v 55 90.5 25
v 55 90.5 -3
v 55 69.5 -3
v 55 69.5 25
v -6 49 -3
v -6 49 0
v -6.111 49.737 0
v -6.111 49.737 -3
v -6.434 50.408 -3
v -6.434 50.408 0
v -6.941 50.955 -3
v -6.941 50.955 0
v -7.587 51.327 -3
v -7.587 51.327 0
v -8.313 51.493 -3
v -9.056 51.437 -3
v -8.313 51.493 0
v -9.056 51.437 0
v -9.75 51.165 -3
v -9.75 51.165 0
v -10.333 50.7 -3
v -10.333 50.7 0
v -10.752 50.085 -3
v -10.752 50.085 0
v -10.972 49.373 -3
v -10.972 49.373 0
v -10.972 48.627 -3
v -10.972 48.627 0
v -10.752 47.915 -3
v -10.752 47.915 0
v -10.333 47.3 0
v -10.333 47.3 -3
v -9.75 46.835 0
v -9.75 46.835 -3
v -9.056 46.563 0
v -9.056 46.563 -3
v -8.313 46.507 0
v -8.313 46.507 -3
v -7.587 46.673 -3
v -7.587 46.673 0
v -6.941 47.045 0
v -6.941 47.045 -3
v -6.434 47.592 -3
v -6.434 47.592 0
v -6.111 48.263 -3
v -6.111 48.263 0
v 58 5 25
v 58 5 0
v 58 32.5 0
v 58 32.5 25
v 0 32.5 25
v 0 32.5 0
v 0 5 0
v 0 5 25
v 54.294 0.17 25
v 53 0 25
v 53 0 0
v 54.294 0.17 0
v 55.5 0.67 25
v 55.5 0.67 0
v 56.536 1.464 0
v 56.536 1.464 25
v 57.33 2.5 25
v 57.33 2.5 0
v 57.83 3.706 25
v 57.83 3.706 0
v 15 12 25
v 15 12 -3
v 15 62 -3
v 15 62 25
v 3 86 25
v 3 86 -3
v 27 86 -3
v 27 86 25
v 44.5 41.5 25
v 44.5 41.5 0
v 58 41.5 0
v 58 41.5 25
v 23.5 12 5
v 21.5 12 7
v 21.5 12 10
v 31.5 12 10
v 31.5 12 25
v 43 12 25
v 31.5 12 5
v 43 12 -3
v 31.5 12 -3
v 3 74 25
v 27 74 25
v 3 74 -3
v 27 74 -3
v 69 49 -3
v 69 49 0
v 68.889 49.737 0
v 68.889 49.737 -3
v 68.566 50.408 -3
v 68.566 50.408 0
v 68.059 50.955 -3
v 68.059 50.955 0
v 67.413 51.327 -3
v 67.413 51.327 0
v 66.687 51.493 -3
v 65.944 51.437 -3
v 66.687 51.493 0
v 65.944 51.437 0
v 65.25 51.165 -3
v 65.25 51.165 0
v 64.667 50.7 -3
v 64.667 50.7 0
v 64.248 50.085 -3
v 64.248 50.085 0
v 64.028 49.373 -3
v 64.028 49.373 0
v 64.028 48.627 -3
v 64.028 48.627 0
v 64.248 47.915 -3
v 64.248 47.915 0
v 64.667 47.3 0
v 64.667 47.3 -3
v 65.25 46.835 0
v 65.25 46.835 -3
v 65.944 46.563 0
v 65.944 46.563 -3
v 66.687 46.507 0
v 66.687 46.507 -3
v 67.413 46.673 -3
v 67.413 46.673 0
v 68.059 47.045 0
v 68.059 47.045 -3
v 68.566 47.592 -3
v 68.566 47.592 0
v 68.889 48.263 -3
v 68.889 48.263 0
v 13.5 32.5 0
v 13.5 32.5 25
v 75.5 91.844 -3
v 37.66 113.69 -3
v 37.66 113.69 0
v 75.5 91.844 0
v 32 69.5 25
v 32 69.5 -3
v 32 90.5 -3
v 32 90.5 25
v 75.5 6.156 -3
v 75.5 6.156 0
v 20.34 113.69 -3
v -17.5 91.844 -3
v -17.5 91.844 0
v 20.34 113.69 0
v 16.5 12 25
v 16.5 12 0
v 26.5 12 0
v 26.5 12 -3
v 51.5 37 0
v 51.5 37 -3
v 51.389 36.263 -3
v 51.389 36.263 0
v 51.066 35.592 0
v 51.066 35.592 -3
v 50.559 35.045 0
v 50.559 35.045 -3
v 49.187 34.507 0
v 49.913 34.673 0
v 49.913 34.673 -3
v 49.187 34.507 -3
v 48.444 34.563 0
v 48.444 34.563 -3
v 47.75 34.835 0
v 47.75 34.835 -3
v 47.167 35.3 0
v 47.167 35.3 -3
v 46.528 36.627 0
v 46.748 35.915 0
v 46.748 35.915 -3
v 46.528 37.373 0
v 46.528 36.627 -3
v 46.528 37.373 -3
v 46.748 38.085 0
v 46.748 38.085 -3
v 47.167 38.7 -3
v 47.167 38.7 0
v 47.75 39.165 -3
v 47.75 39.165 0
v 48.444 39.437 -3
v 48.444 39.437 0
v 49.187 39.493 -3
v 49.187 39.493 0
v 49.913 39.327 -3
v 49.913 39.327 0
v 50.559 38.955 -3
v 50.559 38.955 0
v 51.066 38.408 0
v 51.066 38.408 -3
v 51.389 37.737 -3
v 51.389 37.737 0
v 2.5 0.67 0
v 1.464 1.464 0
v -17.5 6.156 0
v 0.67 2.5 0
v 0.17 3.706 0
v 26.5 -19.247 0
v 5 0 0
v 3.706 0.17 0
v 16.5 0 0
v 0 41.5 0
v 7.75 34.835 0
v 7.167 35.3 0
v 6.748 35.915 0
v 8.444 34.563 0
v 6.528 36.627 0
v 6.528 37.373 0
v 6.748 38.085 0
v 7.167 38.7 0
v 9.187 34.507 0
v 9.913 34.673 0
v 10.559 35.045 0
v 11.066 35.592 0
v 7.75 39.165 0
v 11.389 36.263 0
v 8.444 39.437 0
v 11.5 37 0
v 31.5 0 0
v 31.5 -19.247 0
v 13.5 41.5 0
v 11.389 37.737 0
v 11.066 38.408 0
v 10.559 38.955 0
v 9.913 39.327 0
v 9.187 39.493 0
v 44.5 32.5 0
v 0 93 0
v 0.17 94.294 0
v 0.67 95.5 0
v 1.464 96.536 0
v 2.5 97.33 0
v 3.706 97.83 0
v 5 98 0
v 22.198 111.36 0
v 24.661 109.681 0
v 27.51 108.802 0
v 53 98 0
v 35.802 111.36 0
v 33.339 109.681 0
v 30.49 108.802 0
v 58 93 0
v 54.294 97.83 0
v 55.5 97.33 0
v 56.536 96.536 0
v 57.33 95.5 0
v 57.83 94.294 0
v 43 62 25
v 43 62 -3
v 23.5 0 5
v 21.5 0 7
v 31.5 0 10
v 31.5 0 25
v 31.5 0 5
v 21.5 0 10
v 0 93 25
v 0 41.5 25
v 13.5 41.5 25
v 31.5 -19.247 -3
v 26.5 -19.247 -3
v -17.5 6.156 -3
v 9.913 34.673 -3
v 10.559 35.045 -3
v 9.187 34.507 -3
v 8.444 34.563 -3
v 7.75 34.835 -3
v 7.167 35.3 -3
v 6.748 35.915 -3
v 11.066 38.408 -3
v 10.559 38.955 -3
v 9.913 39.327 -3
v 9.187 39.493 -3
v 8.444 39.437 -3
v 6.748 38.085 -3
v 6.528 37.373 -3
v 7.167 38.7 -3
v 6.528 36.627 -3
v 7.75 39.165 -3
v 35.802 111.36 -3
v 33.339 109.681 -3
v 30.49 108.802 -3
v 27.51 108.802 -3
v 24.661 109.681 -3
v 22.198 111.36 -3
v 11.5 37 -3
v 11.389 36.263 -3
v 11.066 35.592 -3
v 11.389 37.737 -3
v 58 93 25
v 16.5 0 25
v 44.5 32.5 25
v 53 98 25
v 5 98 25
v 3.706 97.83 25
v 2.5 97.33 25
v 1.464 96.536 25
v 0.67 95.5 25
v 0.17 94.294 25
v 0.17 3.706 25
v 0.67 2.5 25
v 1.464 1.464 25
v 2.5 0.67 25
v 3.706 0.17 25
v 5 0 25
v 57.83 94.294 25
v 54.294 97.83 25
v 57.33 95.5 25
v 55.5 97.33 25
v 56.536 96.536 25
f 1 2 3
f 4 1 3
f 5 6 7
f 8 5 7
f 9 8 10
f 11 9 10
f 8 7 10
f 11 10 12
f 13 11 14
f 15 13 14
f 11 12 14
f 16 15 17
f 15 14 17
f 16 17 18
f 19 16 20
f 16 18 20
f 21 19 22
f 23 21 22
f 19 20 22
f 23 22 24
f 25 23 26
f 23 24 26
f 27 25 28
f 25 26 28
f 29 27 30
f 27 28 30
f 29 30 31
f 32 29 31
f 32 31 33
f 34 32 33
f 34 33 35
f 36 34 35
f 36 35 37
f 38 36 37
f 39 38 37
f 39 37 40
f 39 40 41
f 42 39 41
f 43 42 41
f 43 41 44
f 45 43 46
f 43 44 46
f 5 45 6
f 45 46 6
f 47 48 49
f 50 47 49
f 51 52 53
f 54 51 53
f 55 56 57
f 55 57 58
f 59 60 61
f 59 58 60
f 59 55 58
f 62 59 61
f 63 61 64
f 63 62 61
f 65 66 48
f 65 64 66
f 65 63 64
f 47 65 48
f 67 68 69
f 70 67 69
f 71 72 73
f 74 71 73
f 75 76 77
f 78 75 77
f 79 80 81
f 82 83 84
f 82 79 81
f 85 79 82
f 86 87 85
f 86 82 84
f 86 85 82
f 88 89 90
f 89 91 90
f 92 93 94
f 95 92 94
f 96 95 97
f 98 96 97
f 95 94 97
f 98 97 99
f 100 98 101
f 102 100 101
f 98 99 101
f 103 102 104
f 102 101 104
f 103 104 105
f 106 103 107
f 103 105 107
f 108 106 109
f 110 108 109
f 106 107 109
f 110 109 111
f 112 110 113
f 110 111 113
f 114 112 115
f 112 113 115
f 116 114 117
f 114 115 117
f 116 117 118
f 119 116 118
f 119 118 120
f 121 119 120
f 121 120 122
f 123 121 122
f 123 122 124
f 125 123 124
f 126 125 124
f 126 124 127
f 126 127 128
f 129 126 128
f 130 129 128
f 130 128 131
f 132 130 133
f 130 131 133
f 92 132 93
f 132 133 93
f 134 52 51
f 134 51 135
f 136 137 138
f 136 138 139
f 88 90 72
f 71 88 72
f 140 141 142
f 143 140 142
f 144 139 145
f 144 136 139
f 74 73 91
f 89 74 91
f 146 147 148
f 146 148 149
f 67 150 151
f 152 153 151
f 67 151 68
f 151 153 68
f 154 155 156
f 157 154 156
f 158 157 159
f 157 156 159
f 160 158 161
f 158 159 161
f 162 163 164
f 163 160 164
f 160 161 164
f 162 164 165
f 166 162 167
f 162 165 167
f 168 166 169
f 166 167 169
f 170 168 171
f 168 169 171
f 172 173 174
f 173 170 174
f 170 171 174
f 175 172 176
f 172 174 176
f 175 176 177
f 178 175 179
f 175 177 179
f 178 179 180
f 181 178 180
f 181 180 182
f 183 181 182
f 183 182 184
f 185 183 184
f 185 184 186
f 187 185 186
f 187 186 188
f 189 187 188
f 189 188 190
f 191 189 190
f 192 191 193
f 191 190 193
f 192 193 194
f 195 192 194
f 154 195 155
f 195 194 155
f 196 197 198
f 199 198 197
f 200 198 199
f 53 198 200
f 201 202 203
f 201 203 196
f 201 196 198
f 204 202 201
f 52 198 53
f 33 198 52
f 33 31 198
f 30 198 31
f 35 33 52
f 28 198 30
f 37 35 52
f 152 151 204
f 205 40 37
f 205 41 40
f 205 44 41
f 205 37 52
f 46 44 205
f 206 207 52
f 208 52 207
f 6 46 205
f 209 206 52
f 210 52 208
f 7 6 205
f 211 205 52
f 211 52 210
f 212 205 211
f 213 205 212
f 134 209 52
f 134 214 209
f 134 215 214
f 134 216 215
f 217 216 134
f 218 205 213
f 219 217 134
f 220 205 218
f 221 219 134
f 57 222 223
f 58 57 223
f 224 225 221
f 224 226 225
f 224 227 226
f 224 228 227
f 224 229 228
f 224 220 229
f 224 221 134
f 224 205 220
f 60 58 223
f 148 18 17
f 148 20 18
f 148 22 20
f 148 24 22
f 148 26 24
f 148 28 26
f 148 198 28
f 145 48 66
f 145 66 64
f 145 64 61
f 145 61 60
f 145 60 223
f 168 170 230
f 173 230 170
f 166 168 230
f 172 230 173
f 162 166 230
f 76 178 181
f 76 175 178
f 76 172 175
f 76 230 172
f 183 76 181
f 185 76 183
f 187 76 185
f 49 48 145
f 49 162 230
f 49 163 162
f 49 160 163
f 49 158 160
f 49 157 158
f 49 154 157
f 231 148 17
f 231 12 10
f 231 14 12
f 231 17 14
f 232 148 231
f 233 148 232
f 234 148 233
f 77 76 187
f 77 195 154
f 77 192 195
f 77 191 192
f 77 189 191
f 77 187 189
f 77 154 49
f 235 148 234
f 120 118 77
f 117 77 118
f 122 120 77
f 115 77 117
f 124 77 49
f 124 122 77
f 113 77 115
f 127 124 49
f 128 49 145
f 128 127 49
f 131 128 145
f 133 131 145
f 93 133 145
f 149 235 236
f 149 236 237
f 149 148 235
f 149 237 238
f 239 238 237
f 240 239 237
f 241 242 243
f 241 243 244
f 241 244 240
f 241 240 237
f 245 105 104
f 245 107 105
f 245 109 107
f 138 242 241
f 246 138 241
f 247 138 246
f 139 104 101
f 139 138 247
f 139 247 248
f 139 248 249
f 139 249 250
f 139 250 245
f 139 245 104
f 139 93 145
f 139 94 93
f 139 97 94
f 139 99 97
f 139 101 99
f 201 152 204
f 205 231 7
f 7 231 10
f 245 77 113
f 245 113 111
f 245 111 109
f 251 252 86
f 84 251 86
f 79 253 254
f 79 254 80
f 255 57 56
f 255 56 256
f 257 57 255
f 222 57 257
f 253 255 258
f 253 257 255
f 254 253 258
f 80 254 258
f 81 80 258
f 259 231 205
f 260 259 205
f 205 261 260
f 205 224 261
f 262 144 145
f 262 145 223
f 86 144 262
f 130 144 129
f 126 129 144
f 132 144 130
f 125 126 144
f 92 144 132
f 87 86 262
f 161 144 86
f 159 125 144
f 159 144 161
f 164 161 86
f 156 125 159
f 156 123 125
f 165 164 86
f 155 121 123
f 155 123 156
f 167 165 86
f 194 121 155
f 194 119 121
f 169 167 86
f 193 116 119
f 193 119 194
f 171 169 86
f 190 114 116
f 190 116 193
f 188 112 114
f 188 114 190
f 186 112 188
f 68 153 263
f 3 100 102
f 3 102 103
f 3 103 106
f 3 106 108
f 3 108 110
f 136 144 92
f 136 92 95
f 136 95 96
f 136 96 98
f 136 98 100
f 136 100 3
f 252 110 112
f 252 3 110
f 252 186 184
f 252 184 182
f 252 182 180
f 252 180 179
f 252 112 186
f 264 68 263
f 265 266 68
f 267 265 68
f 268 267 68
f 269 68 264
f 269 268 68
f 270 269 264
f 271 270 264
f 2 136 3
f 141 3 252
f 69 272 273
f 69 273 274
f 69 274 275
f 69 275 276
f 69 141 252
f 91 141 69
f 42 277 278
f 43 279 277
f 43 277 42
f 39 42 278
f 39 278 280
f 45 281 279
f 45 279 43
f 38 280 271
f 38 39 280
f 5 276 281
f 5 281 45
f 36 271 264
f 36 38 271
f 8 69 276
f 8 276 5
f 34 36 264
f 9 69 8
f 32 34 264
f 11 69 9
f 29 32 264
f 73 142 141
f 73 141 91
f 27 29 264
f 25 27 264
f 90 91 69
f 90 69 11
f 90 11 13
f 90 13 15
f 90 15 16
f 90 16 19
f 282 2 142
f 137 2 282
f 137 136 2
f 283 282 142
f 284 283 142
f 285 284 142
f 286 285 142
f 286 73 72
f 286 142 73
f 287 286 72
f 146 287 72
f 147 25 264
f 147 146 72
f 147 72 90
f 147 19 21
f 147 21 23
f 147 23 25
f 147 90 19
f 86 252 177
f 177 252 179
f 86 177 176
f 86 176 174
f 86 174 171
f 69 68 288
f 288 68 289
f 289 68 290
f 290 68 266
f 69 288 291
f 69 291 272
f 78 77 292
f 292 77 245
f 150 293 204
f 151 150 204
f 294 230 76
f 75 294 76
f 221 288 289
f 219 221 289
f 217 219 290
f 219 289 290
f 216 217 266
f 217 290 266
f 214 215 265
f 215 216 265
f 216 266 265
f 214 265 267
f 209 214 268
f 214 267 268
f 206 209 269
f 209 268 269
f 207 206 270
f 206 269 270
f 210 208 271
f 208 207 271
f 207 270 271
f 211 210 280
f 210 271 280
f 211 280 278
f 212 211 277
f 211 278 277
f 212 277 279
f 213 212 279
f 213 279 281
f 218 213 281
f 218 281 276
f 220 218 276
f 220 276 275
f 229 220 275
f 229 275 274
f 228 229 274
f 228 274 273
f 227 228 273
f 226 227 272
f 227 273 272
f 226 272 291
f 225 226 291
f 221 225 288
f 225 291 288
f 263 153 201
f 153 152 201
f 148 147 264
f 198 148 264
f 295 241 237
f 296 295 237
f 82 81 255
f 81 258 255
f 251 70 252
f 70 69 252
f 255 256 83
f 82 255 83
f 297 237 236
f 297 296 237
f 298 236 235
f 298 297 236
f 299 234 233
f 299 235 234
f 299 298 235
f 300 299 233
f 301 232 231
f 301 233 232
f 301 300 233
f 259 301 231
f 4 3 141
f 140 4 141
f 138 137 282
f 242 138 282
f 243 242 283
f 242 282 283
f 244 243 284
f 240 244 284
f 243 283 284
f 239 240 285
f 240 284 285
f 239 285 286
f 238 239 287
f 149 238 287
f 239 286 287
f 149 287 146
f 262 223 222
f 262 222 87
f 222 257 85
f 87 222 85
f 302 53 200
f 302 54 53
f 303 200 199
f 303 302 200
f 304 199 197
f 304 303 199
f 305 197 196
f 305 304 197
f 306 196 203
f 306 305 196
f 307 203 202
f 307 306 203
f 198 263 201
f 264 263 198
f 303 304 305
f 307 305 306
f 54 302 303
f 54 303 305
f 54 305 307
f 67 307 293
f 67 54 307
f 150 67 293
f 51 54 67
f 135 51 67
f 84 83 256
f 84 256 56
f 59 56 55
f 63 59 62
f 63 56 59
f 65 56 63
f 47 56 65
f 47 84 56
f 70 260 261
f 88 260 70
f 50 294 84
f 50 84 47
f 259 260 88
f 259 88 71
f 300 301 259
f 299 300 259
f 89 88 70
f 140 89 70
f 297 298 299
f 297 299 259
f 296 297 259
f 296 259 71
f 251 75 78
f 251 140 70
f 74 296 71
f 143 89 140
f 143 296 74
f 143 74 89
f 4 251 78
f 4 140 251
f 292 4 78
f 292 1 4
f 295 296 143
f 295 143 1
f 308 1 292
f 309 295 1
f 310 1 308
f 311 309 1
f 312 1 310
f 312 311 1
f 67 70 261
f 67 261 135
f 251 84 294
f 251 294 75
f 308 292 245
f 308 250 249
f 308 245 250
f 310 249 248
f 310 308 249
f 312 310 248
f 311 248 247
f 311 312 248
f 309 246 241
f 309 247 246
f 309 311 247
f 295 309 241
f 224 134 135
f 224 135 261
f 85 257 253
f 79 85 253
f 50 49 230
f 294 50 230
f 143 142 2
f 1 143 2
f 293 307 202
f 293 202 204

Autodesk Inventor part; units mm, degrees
ref_plane "YZ Plane" through (0, 0, 0) normal (1, 0, 0) x (0, 1, 0)
ref_plane "XZ Plane" through (0, 0, 0) normal (0, 1, 0) x (-1, 0, 0)
ref_plane "XY Plane" through (0, 0, 0) normal (0, 0, 1) x (1, 0, 0)
sketch "Sketch1" plane through (0, 0, 0) normal (0, 0, 1) x (1, 0, 0)
  line L0 (0, 0) -> (58, 0)
  line L1 (58, 0) -> (58, 98)
  line L2 (58, 98) -> (0, 98)
  line L3 (0, 98) -> (0, 0)
  line L4 (15, 62) -> (43, 62)
  line L5 (43, 62) -> (43, 12)
  line L6 (43, 12) -> (15, 12)
  line L7 (15, 12) -> (15, 62)
  circle A0 centre (9, 37) radius 2.5
  circle A1 centre (49, 37) radius 2.5
  line L8 (9, 37) -> (49, 37) construction
  line L9 (3, 86) -> (27, 86)
  line L10 (27, 86) -> (27, 74)
  line L11 (27, 74) -> (3, 74)
  line L12 (3, 74) -> (3, 86)
  circle A2 centre (-8.5, 49) radius 2.5
  circle A3 centre (66.5, 49) radius 2.5
  line L13 (-8.5, 49) -> (66.5, 49) construction
  circle A4 centre (-8.5, 49) radius 5 construction
  circle A5 centre (66.5, 49) radius 5 construction
  line L14 (0, 0) -> (-13.3155, 47.6544)
  line L15 (0, 98) -> (-13.3155, 50.3456)
  line L16 (58, 98) -> (71.3155, 50.3456)
  line L17 (58, 0) -> (71.3155, 47.6544)
  arc A6 (-13.3155, 50.3456) -> (-13.3155, 47.6544) centre (-8.5, 49) ccw
  arc A7 (71.3155, 47.6544) -> (71.3155, 50.3456) centre (66.5, 49) ccw
  line L18 (32, 90.5) -> (55, 90.5)
  line L19 (55, 90.5) -> (55, 69.5)
  line L20 (55, 69.5) -> (32, 69.5)
  line L21 (32, 69.5) -> (32, 90.5)
  line L22 (3, 80) -> (55, 80) construction
  point P0 (29, 62)
  point P1 (29, 98)
  point P2 (29, 37)
  point P3 (15, 37)
  point P4 (29, 49)
  point P5 (0, 49)
  point P6 (29, 80)
  dimension "d0" = 58
  dimension "d1" = 98
  dimension "d2" = 28
  dimension "d3" = 50
  dimension "d4" = 12
  dimension "d5" = 5
  dimension "d6" = 5
  dimension "d7" = 40
  dimension "d9" = 24
  dimension "d10" = 12
  dimension "d12" = 12
  dimension "d13" = 5
  dimension "d14" = 5
  dimension "d15" = 75
  dimension "d16" = 10
  dimension "d17" = 10
  dimension "d18" = 23
  dimension "d19" = 21
  dimension "d20" = 5
extrude "Extrusion1" add sketch "Sketch1" against normal blind 3
extrude "Extrusion2" add sketch "Sketch1" along normal blind 25 contours L3 L2 L1 L0
fillet "Fillet1" radius 5 4 edges at (58, 98, 12.5) (58, 0, 12.5) (0, 0, 12.5) (0, 98, 12.5)
sketch "Sketch2" plane through (0, 0, 0) normal (0, 0, 1) x (1, 0, 0)
  circle A0 centre (49, 37) radius 2.5 projected
  circle A1 centre (9, 37) radius 2.5 projected
  line L0 (0, 5) -> (0, 93) projected
  line L1 (0, 32.5) -> (13.5, 32.5)
  line L2 (13.5, 32.5) -> (13.5, 41.5)
  line L3 (13.5, 41.5) -> (0, 41.5)
  line L4 (0, 41.5) -> (0, 32.5)
  line L5 (58, 5) -> (58, 93) projected
  line L6 (58, 32.5) -> (44.5, 32.5)
  line L7 (44.5, 32.5) -> (44.5, 41.5)
  line L8 (44.5, 41.5) -> (58, 41.5)
  line L9 (58, 41.5) -> (58, 32.5)
  line L10 (15, 62) -> (15, 12) projected
  line L11 (43, 12) -> (43, 62) projected
  point P0 (0, 0)
  point P1 (13.5, 37)
  point P2 (44.5, 37)
  dimension "d29" = 4.5
  dimension "d30" = 4.5
  dimension "d31" = 9
extrude "Extrusion3" cut sketch "Sketch2" along normal through all
sketch "Sketch3" plane through (0, 0, -3) normal (0, 0, -1) x (-1, 0, 0)
  circle A0 centre (-29, -5) radius 2.5 construction
  circle A1 centre (-29, 103) radius 2.5 construction
  line L0 (0, 98) -> (-58, 98) projected
  line L1 (-58, 0) -> (0, 0) projected
  line L2 (-58, 98) -> (-29.6325, 105.4187)
  line L3 (0, 98) -> (-28.3675, 105.4187)
  line L4 (0, 0) -> (-28.3675, -7.4187)
  line L5 (-58, 0) -> (-29.6325, -7.4187)
  arc A2 (-29.6325, -7.4187) -> (-28.3675, -7.4187) centre (-29, -5) ccw
  arc A3 (-28.3675, 105.4187) -> (-29.6325, 105.4187) centre (-29, 103) ccw
  point P0 (-29, 98)
  dimension "d34" = 5
  dimension "d35" = 5
  dimension "d36" = 5
  dimension "d37" = 5
extrude "Extrusion4" add sketch "Sketch3" against normal blind 3
fillet "Fillet2" radius 5 4 edges at (0, 98, -1.5) (58, 98, -1.5) (58, 0, -1.5) (0, 0, -1.5)
sketch "Sketch4" plane through (0, 0, -3) normal (0, 0, -1) x (-1, 0, 0)
  line L0 (-15, 62) -> (-15, 12) projected
  line L1 (-15, 12) -> (-43, 12) projected
  line L2 (-43, 12) -> (-43, 62) projected
  line L3 (-43, 62) -> (-15, 62) projected
  line L4 (-32, 90.5) -> (-32, 69.5) projected
  line L5 (-32, 69.5) -> (-55, 69.5) projected
  line L6 (-55, 69.5) -> (-55, 90.5) projected
  line L7 (-55, 90.5) -> (-32, 90.5) projected
  line L8 (-3, 86) -> (-3, 74) projected
  line L9 (-3, 74) -> (-27, 74) projected
  line L10 (-27, 74) -> (-27, 86) projected
  line L11 (-27, 86) -> (-3, 86) projected
  circle A0 centre (-49, 37) radius 2.5 projected
  circle A1 centre (-9, 37) radius 2.5 projected
  circle A2 centre (-66.5, 49) radius 2.5 projected
  circle A3 centre (8.5, 49) radius 2.5 projected
  arc A4 (-2.7778, -0.7265) -> (0.7727, 2.7653) centre (-4.0429, 4.1109) ccw projected
  line L12 (0.7727, 2.7653) -> (13.3155, 47.6544) projected
  arc A5 (13.3155, 47.6544) -> (13.3155, 50.3456) centre (8.5, 49) ccw projected
  line L13 (13.3155, 50.3456) -> (0.7727, 95.2347) projected
  arc A6 (0.7727, 95.2347) -> (-2.7778, 98.7265) centre (-4.0429, 93.8891) ccw projected
  line L14 (-28.3675, 105.4187) -> (-2.7778, 98.7265) projected
  arc A7 (-28.3675, 105.4187) -> (-29.6325, 105.4187) centre (-29, 103) ccw projected
  line L15 (-55.2222, 98.7265) -> (-29.6325, 105.4187) projected
  arc A8 (-55.2222, 98.7265) -> (-58.7727, 95.2347) centre (-53.9571, 93.8891) ccw projected
  line L16 (-58.7727, 95.2347) -> (-71.3155, 50.3456) projected
  arc A9 (-71.3155, 50.3456) -> (-71.3155, 47.6544) centre (-66.5, 49) ccw projected
  line L17 (-71.3155, 47.6544) -> (-58.7727, 2.7653) projected
  arc A10 (-58.7727, 2.7653) -> (-55.2222, -0.7265) centre (-53.9571, 4.1109) ccw projected
  line L18 (-55.2222, -0.7265) -> (-29.6325, -7.4187) projected
  arc A11 (-29.6325, -7.4187) -> (-28.3675, -7.4187) centre (-29, -5) ccw projected
  line L19 (-28.3675, -7.4187) -> (-2.7778, -0.7265) projected
  arc A12 (-27.3554, 109.2885) -> (-30.6446, 109.2885) centre (-29, 103) ccw
  line L20 (-27.3554, 109.2885) -> (-1.7658, 102.5963)
  arc A13 (4.6251, 96.3111) -> (-1.7658, 102.5963) centre (-4.0429, 93.8891) ccw
  line L21 (4.6251, 96.3111) -> (17.168, 51.422)
  arc A14 (17.168, 46.578) -> (17.168, 51.422) centre (8.5, 49) ccw
  line L22 (17.168, 46.578) -> (4.6251, 1.6889)
  arc A15 (-1.7658, -4.5963) -> (4.6251, 1.6889) centre (-4.0429, 4.1109) ccw
  line L23 (-1.7658, -4.5963) -> (-27.3554, -11.2885)
  arc A16 (-30.6446, -11.2885) -> (-27.3554, -11.2885) centre (-29, -5) ccw
  line L24 (-30.6446, -11.2885) -> (-56.2342, -4.5963)
  arc A17 (-62.6251, 1.6889) -> (-56.2342, -4.5963) centre (-53.9571, 4.1109) ccw
  line L25 (-62.6251, 1.6889) -> (-75.168, 46.578)
  arc A18 (-75.168, 51.422) -> (-75.168, 46.578) centre (-66.5, 49) ccw
  line L26 (-75.168, 51.422) -> (-62.6251, 96.3111)
  arc A19 (-56.2342, 102.5963) -> (-62.6251, 96.3111) centre (-53.9571, 93.8891) ccw
  line L27 (-56.2342, 102.5963) -> (-30.6446, 109.2885)
  point P0 (0, 0)
  dimension "d41" = 4
extrude "Extrusion5" add sketch "Sketch4" against normal blind 3 contours L20 A13 L21 A14 L22 A15 L23 A16 L24 A17 L25 A18 L26 A19 L27 A12
sketch "Sketch6" plane through (0, 0, -3) normal (0, 0, -1) x (-1, 0, 0)
  line L0 (-29, 118.6904) -> (17.5, 91.8437) construction
  line L1 (17.5, 91.8437) -> (17.5, 38.1501) construction
  line L2 (17.5, 38.1501) -> (-29, 11.3033) construction
  line L3 (-29, 11.3033) -> (-75.5, 38.1501) construction
  line L4 (-75.5, 38.1501) -> (-75.5, 91.8437) construction
  line L5 (-75.5, 91.8437) -> (-29, 118.6904) construction
  line L6 (-29, -20.6904) -> (-75.5, 6.1563) construction
  line L7 (-75.5, 6.1563) -> (-75.5, 59.8499) construction
  line L8 (-75.5, 59.8499) -> (-29, 86.6967) construction
  line L9 (-29, 86.6967) -> (17.5, 59.8499) construction
  line L10 (17.5, 59.8499) -> (17.5, 6.1563) construction
  line L11 (17.5, 6.1563) -> (-29, -20.6904) construction
  line L12 (-15, 12) -> (-43, 12) construction
  arc A0 (-75.168, 51.422) -> (-75.168, 46.578) centre (-66.5, 49) ccw construction
  line L13 (-75.5, 59.8499) -> (-75.5, 38.1501) construction
  line L14 (17.5, 59.8499) -> (17.5, 38.1501) construction
  arc A1 (17.168, 46.578) -> (17.168, 51.422) centre (8.5, 49) ccw construction
  arc A2 (4.6251, 96.3111) -> (-1.7658, 102.5963) centre (-4.0429, 93.8891) ccw construction
  arc A3 (-1.7658, -4.5963) -> (4.6251, 1.6889) centre (-4.0429, 4.1109) ccw construction
  line L15 (-72.6977, 49) -> (-55.2357, 96.3111)
  line L16 (-55.2357, 96.3111) -> (0, 98)
  line L17 (0, 98) -> (14.2585, 49.0151)
  line L18 (14.2585, 49.0151) -> (2.9964, 0)
  line L19 (2.9964, 0) -> (-59.2966, 2.9606)
  line L20 (-59.2966, 2.9606) -> (-72.6977, 49)
  line L21 (-75.5, 91.8437) -> (-75.5, 6.1563)
  line L22 (-75.5, 6.1563) -> (-29, -20.6904)
  line L23 (-29, -20.6904) -> (17.5, 6.1563)
  line L24 (17.5, 91.8437) -> (17.5, 6.1563)
  line L25 (17.5, 91.8437) -> (-29, 118.6904)
  line L26 (-29, 118.6904) -> (-75.5, 91.8437)
  point P0 (0, 0)
  point P1 (-29, 64.9969)
  point P2 (-29, 33.0031)
  point P3 (-29, 12)
extrude "Extrusion7" add sketch "Sketch6" against normal blind 3
sketch "Sketch7" plane through (0, 0, -3) normal (0, 0, -1) x (-1, 0, 0)
  line L0 (-75.5, 91.8437) -> (-29, 118.6904) projected
  circle A0 centre (-29, 118.6904) radius 10
  point P0 (0, 0)
  dimension "d48" = 20
extrude "Extrusion8" cut sketch "Sketch7" against normal through all
sketch "Sketch9" plane through (0, 0, 25) normal (0, 0, 1) x (1, 0, 0)
  line L0 (26.5, 12) -> (26.5, -20.6904)
  line L1 (26.5, -20.6904) -> (31.5, -20.6904)
  line L2 (31.5, -20.6904) -> (31.5, 12)
  line L3 (31.5, 12) -> (26.5, 12)
  line L4 (29, 12) -> (29, -20.6904) construction
  line L5 (43, 12) -> (15, 12) projected
  point P0 (0, 0)
  dimension "d51" = 5
extrude "Extrusion9" cut sketch "Sketch9" against normal through all
sketch "Sketch11" plane through (0, 0, 0) normal (0, 0, 1) x (1, 0, 0)
  line L0 (31.5, 0) -> (31.5, -19.2471) projected
  line L1 (31.5, 0) -> (53, 0) projected
  line L2 (31.5, -19.2471) -> (75.5, 6.1563) projected
  line L3 (31.5, 0) -> (53, 0) projected
  line L4 (36.5, 0) -> (36.5, -16.3603)
  line L5 (31.5, -19.2471) -> (36.5, -16.3603)
  line L6 (31.5, 0) -> (36.5, 0)
  point P0 (0, 0)
  dimension "d54" = 5
extrude "Extrusion10" add sketch "Sketch11" along normal blind 5
sketch "Sketch12" plane through (0, 0, 5) normal (0, 0, 1) x (1, 0, 0)
  line L0 (31.5, -19.2471) -> (75.5, 6.1563) projected
  line L1 (31.5, -19.2471) -> (29, -20.6904)
  line L2 (29, -20.6904) -> (26.5, -19.2471)
  line L3 (-17.5, 6.1563) -> (26.5, -19.2471) projected
  line L4 (-17.5, 6.1563) -> (26.5, -19.2471) projected
  line L5 (21.5, -16.3603) -> (21.5, 0)
  line L6 (5, 0) -> (26.5, 0) projected
  line L7 (21.5, 0) -> (36.5, 0)
  line L8 (36.5, 0) -> (36.5, -16.3603)
  line L9 (31.5, 0) -> (31.5, -19.2471) projected
  line L10 (31.5, -19.2471) -> (36.5, -16.3603) projected
  line L11 (36.5, -16.3603) -> (36.5, 0) projected
  line L12 (31.5, 0) -> (36.5, 0) projected
  line L13 (26.5, -19.2471) -> (26.5, 0) projected
  line L14 (21.5, -16.3603) -> (26.5, -19.2471)
  line L15 (29, -20.6904) -> (36.5, -16.3603)
  line L16 (21.5, 0) -> (36.5, 0)
  line L17 (31.5, 0) -> (53, 0) projected
  line L18 (21.5, -16.3603) -> (29, -20.6904)
  line L19 (29, -20.6904) -> (36.5, -16.3603)
  line L20 (36.5, -16.3603) -> (36.5, 0)
  line L21 (21.5, 0) -> (21.5, -16.3603)
  point P0 (0, 0)
  dimension "d57" = 5
extrude "Extrusion11" add sketch "Sketch12" along normal blind 5
sketch "Sketch13" plane through (5, 0, 0) normal (0, -1, 0) x (1, 0, 0)
  line L0 (21.5, 25) -> (21.5, -3) projected
  line L1 (0, 0) -> (21.5, 0) projected
  line L2 (21.5, 25) -> (11.5, 25)
  line L3 (11.5, 25) -> (11.5, 0)
  line L4 (11.5, 0) -> (21.5, 0)
  line L5 (21.5, 0) -> (21.5, 25)
  point P0 (-5, 0)
  dimension "d60" = 10
extrude "Extrusion12" cut sketch "Sketch13" against normal blind 15
sketch "Sketch14" plane through (21.5, 0, 5) normal (0, 1, 0) x (1, 0, 0)
  line L0 (10, -5) -> (10, 0) projected
  line L1 (10, 0) -> (0, 0) projected
  line L2 (0, 0) -> (0, -5) projected
  line L3 (0, -5) -> (10, -5) projected
  point P0 (-21.5, 5)
extrude "Extrusion13" add sketch "Sketch14" along normal blind 12
sketch "Sketch15" plane through (0, 0, 0) normal (0, 0, 1) x (1, 0, 0)
  line L0 (36.5, 0) -> (53, 0) projected
  line L1 (36.5, 0) -> (21.5, 0)
  line L2 (21.5, 0) -> (21.5, -20.6904)
  line L3 (21.5, -20.6904) -> (36.5, -20.6904)
  line L4 (36.5, -20.6904) -> (36.5, 0)
  point P0 (0, 0)
  point P1 (21.5, -16.3603)
  point P2 (29, -20.6904)
  point P3 (29, -20.6904)
extrude "Extrusion14" cut sketch "Sketch15" along normal through all
chamfer "Chamfer1" distance 2 angle 45 1 edges at (21.5, 6, 5)
properties part number "BA27" material "ABS Plastic"
